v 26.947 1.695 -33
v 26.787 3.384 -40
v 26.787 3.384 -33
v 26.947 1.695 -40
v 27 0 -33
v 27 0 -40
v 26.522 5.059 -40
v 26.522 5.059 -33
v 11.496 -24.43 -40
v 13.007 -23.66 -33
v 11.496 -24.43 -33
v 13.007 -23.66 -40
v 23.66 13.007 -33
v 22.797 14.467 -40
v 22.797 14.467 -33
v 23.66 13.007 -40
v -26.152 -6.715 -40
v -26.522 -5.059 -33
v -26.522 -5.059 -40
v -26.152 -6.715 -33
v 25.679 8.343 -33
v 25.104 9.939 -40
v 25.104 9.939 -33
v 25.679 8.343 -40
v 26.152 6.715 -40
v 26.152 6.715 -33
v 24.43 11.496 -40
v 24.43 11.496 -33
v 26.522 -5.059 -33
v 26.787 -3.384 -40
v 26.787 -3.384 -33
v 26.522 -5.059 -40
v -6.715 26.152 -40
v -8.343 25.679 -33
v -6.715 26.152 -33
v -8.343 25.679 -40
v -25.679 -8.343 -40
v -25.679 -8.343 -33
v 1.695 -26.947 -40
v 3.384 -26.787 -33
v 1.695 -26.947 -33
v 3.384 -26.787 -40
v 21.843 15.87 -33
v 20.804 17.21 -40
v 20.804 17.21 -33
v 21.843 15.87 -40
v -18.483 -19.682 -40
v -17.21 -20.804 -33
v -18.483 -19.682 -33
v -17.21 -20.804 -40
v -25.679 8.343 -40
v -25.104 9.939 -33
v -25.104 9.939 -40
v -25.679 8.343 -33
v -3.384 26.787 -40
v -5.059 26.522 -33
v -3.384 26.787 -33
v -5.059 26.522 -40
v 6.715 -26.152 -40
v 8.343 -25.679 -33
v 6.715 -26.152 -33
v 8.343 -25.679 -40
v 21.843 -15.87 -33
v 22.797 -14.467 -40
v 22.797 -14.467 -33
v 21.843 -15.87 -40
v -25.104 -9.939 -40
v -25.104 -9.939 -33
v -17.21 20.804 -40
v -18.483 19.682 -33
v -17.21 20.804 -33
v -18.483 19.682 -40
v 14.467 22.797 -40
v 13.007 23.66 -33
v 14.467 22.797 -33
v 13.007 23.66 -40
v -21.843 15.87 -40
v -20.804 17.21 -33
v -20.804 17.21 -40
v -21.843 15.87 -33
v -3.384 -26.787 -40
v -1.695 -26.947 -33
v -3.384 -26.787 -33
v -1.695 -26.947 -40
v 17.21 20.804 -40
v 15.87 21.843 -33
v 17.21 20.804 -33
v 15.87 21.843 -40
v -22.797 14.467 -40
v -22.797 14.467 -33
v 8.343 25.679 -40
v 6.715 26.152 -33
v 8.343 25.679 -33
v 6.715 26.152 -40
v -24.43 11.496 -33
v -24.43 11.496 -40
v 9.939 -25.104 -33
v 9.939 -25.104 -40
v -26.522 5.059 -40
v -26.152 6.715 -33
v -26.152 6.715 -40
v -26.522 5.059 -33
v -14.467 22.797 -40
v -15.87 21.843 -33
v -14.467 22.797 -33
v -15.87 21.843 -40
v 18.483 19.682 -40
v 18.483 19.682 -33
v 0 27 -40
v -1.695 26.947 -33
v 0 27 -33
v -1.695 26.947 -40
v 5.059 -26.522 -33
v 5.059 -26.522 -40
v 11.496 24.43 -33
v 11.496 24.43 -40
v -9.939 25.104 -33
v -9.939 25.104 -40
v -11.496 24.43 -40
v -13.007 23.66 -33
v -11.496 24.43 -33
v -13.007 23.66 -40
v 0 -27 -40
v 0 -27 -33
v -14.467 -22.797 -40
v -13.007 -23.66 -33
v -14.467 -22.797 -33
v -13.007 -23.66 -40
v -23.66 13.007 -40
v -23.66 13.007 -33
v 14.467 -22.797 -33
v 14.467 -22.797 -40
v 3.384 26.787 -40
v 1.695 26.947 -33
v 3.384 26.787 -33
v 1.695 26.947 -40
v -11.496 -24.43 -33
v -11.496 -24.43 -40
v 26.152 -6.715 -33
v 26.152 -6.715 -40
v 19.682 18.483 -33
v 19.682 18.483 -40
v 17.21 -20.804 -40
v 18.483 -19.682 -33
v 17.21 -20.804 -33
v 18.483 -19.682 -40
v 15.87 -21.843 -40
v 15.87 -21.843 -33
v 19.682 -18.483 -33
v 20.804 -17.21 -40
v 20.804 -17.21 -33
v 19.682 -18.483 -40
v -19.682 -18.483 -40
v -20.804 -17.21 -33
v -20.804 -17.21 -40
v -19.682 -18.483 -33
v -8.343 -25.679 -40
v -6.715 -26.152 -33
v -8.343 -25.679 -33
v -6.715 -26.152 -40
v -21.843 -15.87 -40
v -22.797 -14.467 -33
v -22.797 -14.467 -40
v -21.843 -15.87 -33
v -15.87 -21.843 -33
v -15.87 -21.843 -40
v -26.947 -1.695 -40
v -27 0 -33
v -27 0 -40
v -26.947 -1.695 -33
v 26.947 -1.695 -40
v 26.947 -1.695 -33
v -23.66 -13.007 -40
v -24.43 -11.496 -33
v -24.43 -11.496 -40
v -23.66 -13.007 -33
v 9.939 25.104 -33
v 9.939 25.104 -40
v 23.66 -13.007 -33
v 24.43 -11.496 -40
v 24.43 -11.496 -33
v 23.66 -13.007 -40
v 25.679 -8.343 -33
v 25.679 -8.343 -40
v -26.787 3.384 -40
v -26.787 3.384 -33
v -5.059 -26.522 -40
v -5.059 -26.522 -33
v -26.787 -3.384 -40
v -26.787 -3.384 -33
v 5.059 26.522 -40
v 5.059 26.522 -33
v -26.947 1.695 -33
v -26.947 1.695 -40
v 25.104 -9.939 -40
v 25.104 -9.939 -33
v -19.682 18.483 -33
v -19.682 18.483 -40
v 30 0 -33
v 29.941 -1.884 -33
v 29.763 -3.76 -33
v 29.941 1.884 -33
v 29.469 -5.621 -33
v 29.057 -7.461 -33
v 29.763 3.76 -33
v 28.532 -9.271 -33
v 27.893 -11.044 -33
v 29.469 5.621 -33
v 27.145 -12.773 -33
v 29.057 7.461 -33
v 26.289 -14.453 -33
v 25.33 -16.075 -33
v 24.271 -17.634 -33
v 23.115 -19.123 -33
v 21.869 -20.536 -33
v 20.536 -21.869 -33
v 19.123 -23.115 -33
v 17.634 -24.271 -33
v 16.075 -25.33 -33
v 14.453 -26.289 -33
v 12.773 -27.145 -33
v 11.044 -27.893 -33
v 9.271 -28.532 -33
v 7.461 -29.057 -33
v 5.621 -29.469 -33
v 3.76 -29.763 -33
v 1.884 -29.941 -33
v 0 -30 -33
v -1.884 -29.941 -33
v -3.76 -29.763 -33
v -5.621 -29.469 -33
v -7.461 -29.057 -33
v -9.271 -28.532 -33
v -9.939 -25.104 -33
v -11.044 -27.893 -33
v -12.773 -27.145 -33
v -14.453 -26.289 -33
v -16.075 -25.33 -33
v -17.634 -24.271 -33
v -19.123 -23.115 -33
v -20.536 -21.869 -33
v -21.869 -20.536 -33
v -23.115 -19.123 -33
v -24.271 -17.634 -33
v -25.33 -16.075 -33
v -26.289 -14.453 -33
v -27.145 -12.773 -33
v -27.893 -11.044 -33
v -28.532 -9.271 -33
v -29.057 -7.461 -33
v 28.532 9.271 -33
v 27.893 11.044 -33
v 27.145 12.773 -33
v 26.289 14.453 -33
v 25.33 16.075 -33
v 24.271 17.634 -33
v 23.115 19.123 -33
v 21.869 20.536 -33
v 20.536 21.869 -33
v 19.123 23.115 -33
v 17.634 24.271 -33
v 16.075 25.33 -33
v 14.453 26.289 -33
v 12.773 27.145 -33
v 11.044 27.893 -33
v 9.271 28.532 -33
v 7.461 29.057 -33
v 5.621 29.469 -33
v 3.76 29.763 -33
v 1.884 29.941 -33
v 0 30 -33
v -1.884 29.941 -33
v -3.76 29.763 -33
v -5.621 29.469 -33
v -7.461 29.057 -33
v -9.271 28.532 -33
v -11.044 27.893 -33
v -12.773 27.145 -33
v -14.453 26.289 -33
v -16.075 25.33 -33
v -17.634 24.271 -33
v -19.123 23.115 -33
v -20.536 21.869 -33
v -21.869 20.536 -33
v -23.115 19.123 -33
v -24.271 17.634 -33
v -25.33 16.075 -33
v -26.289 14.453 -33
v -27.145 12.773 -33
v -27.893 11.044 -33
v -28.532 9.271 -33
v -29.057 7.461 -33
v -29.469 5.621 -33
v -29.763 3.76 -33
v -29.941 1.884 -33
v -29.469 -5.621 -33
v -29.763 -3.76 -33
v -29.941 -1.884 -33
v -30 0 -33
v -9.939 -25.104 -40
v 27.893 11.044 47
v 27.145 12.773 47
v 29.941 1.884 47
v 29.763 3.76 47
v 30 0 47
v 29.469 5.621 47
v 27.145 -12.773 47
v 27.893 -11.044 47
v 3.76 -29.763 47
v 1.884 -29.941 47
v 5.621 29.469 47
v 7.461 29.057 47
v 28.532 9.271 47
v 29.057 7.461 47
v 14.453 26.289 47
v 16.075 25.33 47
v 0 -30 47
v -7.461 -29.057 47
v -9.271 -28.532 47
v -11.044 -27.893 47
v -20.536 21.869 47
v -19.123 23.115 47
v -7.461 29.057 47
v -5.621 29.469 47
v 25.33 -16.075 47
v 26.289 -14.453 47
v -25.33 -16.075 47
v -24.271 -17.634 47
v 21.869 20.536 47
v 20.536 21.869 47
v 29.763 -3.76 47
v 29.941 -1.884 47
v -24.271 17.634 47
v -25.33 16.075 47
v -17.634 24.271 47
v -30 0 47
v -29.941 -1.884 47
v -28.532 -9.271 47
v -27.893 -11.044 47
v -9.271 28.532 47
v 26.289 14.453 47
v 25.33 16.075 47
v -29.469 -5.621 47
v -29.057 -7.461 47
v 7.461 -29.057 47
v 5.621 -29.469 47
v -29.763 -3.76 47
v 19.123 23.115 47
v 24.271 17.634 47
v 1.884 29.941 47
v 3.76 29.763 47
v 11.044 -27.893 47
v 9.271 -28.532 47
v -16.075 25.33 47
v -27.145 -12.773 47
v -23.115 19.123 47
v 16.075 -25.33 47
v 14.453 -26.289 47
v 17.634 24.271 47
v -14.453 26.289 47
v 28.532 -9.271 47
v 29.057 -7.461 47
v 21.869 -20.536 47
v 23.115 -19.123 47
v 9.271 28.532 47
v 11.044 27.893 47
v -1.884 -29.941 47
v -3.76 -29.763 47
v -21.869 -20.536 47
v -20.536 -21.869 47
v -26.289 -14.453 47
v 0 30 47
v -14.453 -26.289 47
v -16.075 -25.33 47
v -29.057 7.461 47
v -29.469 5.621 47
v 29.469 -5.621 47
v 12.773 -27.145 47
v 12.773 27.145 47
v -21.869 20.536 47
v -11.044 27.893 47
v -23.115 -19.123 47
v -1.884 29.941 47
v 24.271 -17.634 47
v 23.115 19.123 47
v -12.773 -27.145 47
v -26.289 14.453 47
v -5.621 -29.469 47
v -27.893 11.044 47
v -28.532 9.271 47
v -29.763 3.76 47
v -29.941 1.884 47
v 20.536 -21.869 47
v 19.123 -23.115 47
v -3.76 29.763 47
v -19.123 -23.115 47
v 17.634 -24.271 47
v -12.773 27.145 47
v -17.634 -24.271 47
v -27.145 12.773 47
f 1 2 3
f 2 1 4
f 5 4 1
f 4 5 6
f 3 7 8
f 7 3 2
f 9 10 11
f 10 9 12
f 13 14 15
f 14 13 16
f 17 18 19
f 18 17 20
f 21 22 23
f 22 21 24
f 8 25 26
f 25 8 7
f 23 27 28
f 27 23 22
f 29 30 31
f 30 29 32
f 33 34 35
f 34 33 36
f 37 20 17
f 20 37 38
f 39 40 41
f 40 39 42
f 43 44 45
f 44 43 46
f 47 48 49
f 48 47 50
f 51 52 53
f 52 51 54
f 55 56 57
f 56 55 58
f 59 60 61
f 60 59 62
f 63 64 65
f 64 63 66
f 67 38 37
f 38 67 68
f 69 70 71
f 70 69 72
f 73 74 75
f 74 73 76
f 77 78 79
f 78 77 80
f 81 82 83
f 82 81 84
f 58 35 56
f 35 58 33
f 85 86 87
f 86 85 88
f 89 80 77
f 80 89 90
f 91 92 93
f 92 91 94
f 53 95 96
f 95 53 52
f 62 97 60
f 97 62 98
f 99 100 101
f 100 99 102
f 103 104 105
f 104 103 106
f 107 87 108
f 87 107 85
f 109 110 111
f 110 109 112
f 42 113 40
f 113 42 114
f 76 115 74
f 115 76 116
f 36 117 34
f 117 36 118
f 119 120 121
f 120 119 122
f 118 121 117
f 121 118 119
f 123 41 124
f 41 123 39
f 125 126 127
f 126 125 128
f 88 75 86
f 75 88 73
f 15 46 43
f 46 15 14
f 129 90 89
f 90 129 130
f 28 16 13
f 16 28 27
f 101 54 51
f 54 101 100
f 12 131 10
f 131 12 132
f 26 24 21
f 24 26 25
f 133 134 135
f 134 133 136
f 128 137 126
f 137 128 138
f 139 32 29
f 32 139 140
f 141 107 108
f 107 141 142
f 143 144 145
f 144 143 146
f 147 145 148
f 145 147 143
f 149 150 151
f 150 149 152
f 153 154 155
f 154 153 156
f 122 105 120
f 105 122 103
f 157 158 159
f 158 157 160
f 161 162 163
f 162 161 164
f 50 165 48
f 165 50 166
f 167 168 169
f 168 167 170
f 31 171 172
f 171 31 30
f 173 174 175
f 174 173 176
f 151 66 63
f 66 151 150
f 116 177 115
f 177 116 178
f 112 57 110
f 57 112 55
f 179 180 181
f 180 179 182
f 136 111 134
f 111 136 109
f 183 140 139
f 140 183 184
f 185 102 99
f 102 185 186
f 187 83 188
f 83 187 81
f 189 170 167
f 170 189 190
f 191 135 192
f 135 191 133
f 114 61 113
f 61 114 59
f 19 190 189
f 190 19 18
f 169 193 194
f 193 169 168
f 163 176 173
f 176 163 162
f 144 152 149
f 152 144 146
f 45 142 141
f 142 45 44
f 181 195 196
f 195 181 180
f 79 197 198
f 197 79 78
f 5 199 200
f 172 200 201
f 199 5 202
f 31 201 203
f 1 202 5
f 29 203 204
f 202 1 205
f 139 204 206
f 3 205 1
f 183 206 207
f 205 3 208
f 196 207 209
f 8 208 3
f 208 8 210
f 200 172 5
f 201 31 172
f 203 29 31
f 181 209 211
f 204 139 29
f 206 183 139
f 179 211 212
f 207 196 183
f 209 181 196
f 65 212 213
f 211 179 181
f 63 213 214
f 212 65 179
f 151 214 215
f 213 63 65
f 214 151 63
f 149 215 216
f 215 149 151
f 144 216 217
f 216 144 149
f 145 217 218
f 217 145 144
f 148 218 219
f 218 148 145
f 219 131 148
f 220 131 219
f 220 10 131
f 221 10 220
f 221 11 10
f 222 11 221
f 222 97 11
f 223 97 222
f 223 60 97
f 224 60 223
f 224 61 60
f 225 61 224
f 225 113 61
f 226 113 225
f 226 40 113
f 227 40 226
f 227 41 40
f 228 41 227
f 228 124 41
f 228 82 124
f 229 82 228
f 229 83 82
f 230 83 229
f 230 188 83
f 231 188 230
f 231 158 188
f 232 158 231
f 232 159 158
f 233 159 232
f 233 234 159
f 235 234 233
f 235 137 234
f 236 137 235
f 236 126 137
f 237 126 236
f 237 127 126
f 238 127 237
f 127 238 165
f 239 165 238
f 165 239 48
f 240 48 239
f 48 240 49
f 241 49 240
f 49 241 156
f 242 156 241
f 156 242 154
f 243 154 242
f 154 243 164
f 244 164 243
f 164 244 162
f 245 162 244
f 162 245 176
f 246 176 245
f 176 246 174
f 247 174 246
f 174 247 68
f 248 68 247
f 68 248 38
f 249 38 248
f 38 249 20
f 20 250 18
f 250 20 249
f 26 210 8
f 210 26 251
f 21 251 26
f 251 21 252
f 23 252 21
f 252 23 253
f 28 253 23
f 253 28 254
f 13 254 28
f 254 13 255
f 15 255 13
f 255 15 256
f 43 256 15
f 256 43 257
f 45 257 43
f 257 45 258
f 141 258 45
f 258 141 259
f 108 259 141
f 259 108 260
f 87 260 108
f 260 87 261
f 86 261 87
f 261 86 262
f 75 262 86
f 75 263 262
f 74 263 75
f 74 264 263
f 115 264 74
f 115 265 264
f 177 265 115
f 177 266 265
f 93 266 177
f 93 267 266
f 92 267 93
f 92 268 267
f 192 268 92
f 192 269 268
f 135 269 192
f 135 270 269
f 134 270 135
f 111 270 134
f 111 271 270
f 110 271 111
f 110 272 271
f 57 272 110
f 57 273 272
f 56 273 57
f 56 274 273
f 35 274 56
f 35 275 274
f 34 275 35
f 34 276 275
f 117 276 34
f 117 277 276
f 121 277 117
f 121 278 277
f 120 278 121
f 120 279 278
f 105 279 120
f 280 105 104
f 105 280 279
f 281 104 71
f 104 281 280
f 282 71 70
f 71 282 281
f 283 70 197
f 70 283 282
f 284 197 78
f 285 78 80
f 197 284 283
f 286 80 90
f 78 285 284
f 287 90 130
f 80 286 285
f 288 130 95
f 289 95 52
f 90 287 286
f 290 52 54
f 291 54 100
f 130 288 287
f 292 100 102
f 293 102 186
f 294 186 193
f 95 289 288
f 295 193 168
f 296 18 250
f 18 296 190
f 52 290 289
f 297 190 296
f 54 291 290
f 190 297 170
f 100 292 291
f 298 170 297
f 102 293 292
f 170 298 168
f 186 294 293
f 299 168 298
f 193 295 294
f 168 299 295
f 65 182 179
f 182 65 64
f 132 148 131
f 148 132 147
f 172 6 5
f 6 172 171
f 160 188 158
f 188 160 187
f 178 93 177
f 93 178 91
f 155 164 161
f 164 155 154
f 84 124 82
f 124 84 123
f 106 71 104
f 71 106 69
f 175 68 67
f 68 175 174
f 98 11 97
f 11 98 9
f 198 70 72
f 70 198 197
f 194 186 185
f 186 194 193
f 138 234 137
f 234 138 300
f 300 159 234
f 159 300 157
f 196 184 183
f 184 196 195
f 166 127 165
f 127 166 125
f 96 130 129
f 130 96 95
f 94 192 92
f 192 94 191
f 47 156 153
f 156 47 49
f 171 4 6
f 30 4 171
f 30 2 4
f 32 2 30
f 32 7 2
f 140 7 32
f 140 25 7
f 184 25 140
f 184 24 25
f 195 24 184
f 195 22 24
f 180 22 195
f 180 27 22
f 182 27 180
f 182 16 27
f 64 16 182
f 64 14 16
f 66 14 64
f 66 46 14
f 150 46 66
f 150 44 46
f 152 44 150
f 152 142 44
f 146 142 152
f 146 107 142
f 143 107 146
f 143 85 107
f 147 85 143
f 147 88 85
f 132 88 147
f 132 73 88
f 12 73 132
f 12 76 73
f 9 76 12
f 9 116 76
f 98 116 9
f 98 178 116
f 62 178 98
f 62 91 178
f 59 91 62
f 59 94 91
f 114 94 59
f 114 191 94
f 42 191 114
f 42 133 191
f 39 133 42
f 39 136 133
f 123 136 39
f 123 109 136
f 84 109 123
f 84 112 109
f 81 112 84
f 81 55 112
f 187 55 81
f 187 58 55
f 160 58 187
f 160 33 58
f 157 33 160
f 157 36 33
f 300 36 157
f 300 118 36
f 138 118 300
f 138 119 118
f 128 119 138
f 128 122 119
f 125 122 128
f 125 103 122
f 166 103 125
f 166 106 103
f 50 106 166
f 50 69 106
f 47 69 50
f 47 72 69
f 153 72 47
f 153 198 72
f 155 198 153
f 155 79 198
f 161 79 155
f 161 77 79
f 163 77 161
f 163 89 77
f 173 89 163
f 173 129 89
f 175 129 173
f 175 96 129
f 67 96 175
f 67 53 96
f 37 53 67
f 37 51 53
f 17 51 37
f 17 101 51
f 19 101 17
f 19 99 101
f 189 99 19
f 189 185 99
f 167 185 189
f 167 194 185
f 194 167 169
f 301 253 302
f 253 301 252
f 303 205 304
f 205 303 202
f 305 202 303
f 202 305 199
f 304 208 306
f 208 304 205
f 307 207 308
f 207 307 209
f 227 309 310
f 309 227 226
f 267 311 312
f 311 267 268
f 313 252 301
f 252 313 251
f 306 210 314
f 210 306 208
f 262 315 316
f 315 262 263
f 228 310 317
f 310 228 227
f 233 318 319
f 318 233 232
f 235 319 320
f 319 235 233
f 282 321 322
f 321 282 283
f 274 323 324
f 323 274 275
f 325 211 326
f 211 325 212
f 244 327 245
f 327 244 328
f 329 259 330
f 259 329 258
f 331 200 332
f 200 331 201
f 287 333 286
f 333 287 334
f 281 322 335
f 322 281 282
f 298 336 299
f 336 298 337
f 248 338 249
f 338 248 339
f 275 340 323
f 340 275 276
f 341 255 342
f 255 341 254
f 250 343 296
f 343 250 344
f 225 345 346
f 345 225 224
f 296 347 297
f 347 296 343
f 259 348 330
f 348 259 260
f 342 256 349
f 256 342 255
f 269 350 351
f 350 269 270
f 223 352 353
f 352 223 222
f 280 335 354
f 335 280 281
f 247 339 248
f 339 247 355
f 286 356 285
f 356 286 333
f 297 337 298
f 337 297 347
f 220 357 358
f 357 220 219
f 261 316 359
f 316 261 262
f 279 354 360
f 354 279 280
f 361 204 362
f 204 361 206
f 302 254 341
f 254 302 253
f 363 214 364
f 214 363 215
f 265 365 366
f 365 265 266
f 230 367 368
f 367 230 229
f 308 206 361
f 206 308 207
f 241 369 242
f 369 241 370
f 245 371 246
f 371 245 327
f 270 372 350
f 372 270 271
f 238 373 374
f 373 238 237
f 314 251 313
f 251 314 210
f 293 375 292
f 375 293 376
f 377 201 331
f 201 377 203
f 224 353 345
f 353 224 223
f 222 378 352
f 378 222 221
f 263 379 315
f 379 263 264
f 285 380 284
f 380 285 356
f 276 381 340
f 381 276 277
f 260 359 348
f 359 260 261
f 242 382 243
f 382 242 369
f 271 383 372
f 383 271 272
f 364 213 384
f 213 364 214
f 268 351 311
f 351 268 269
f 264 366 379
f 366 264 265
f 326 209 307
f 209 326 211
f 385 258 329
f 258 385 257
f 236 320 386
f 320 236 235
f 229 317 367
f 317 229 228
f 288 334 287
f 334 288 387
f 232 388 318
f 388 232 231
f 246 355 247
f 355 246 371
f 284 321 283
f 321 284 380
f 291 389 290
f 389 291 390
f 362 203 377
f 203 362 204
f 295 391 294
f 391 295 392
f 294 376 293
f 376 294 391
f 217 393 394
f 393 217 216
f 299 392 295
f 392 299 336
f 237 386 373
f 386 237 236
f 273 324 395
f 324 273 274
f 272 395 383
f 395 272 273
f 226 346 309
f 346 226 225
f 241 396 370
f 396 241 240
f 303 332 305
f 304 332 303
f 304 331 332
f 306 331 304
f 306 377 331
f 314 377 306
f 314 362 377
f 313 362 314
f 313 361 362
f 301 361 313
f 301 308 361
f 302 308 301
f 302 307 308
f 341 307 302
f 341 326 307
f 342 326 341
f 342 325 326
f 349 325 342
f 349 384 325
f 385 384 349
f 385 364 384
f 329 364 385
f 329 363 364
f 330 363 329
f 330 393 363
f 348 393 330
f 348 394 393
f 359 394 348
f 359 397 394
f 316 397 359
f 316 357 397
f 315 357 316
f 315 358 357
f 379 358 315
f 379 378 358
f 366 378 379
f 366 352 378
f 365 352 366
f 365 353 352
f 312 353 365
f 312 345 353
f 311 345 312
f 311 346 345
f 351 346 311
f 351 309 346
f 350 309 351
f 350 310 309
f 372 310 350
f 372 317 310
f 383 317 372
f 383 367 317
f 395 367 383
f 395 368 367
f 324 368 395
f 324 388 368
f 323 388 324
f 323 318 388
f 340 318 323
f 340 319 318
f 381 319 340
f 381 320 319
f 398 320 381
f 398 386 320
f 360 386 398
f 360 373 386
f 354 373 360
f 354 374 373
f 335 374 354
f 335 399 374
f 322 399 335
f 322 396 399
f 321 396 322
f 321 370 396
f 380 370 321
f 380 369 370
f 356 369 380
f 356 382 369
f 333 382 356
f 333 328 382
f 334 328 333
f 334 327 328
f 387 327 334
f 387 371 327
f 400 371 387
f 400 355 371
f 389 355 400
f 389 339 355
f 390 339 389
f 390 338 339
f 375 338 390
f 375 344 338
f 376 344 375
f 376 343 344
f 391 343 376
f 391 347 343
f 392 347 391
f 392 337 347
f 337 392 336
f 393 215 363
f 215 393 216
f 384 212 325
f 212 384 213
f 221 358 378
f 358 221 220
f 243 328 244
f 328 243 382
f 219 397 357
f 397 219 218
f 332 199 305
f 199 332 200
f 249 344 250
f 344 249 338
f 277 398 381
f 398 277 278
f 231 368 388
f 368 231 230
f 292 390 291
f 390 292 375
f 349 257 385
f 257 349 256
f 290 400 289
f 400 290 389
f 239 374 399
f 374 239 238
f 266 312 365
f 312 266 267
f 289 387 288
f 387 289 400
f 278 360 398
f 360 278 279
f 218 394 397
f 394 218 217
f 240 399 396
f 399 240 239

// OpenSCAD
$fn = 100;
translate(v = [0, 0, -36.5])
{
  union()
  {
    cylinder(h = 7, r = 27, center = true);
    translate(v = [0, 0, 43.5])
    {
      cylinder(h = 80, r = 30, center = true);
    }
  }
}
